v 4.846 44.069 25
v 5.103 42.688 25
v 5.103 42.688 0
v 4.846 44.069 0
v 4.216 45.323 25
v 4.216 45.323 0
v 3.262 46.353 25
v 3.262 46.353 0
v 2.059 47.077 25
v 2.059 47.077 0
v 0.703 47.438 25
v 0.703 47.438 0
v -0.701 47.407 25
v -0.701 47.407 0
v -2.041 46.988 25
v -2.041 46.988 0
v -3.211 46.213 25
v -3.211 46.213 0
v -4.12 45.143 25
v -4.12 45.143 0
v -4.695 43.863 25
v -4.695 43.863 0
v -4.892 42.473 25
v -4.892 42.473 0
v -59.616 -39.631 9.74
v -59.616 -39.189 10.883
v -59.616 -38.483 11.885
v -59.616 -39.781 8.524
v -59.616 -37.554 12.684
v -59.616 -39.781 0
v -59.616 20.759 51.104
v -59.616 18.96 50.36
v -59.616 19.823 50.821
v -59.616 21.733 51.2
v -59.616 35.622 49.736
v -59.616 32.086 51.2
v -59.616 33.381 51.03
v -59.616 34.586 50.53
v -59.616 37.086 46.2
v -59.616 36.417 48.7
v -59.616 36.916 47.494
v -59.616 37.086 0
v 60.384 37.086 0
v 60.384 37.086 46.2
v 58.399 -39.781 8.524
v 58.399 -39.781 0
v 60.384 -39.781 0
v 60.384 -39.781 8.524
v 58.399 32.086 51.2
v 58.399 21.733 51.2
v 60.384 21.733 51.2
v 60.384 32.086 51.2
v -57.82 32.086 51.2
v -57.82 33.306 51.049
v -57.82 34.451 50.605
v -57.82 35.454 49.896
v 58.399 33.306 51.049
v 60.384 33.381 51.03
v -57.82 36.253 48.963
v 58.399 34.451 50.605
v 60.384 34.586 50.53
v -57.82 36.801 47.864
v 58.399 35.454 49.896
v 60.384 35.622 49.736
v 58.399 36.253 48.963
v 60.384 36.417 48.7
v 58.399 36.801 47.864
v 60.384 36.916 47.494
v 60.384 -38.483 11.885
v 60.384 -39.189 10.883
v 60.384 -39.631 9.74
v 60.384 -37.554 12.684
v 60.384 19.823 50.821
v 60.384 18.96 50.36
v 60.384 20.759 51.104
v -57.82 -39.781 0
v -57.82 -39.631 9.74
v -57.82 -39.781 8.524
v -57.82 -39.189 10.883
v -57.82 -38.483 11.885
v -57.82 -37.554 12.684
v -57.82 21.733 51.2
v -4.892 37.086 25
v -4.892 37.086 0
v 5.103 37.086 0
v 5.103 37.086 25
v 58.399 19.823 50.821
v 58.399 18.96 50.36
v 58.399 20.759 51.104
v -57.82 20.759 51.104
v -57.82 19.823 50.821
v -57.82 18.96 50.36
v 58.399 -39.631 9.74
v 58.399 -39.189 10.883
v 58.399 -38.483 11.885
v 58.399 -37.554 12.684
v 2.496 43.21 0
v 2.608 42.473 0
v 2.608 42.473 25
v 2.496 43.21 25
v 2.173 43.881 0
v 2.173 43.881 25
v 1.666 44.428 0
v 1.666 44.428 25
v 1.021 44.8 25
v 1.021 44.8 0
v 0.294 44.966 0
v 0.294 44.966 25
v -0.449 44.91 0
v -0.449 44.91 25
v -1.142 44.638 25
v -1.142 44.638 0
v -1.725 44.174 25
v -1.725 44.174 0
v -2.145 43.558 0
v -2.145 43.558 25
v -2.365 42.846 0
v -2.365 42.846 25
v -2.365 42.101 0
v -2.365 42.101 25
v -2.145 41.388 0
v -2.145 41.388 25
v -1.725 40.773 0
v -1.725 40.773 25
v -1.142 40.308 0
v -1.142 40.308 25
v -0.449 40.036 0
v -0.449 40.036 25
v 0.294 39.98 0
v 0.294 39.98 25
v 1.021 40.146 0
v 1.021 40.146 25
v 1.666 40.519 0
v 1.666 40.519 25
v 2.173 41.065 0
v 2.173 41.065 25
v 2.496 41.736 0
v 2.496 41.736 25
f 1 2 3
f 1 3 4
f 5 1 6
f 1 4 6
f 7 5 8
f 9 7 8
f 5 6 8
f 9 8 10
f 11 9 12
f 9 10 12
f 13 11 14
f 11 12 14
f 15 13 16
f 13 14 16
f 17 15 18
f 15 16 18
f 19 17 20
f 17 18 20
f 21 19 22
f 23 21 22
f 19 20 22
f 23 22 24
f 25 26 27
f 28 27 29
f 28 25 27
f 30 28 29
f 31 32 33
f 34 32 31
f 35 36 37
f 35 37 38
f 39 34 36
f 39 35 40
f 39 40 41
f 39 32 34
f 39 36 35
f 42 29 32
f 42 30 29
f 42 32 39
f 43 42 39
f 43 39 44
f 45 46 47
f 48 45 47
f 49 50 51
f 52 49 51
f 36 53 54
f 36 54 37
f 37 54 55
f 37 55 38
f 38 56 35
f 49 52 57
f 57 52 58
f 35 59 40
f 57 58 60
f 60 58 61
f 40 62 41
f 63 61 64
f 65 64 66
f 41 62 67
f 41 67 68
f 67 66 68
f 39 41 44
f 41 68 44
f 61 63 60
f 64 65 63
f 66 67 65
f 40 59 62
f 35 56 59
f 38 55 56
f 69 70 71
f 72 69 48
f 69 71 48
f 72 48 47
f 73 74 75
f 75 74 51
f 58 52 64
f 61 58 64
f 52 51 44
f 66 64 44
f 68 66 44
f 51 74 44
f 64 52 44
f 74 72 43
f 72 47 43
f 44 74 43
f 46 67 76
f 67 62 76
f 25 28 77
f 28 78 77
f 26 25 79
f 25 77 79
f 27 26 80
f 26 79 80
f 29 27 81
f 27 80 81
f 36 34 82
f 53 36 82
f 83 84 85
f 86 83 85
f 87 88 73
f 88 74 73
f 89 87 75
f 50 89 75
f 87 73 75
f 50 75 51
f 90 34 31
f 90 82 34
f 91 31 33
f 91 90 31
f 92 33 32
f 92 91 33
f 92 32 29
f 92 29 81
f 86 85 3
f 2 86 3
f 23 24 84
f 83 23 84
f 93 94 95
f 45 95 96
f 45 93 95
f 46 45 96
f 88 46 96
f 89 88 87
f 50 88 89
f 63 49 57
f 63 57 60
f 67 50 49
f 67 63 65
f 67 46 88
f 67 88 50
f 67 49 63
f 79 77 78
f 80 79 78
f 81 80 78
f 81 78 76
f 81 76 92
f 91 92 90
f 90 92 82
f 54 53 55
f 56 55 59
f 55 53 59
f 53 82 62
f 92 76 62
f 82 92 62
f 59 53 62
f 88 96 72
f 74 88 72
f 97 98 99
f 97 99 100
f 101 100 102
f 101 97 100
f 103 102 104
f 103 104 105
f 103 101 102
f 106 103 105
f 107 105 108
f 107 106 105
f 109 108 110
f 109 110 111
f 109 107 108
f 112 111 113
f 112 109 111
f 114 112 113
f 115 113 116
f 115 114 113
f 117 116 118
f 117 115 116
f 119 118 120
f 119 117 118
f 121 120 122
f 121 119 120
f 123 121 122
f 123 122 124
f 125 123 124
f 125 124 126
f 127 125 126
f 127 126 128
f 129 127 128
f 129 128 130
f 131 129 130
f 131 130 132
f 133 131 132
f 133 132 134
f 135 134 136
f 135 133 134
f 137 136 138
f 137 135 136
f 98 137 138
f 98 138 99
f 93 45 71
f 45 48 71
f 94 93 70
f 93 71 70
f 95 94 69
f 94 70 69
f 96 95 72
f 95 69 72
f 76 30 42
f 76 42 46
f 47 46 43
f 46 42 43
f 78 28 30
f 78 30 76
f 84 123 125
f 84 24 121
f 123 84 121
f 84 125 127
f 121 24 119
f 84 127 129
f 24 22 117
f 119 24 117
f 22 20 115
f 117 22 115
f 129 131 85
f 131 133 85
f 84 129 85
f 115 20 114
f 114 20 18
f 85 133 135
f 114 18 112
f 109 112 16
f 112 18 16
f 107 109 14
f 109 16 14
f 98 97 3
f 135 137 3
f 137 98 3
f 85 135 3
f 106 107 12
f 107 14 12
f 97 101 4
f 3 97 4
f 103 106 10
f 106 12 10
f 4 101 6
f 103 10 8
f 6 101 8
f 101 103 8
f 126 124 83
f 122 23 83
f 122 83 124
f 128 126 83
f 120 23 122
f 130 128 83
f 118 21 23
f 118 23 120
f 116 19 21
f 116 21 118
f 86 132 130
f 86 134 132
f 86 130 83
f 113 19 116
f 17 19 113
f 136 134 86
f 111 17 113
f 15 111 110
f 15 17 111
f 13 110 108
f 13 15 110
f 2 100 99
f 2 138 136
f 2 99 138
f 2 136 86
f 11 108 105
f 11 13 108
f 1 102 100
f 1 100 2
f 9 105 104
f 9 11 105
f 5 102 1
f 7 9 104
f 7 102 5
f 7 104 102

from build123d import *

# Parameters (mm, degrees)
F1_DEPTH    = 50
F2_T1_DEPTH = 529.8735996938
F0_R        = 2.5
F3_DEPTH    = 25
F0_W        = 1.7954435945
F0_H        = 76.8672563136
F0_W_2      = 1.9858591259
F4_DEPTH    = 51.2
F5_SIZE2    = 40
F5_SIZE     = 60
F5_2_SIZE2  = 40
F5_2_SIZE   = 60
F6_R        = 5


# Not quite as in the source:
# - a fillet or chamfer that OpenCascade refuses, or shapes differently, is made with other operations: its cross-section is extruded or revolved along the edge and cut away or added


with BuildPart() as f1:
    # F0 (on Top) → F1 (new body)
    with BuildSketch(Plane.XY):
        Polygon((-4.8924816283, 37.0864719152), (-57.8201711178, 37.0864719152), (-57.8201711178, -39.7807843983), (58.3985261619, -39.7807843983), (58.3985261619, 37.0864719152), (5.1028808584, 37.0864719152), align=None)
    extrude(amount=F1_DEPTH)

    # F2: chamfer of 80 x 50 on 1 edges, made by hand

    # F2_s2 → F2_t1 (cut)
    with BuildSketch(Plane.YZ.offset(-264.6476223249)):
        Polygon((40.2192156017, 50), (-39.7807843983, 0), (-39.7807843983, 50), align=None)
    extrude(amount=F2_T1_DEPTH, mode=Mode.SUBTRACT)

    # F0 (on Top) → F4 (join)
    with BuildSketch(Plane.XY):
        with Locations((-58.717892915, -1.3471562415)):
            Rectangle(F0_W, F0_H)
        with Locations((59.3914557248, -1.3471562415)):
            Rectangle(F0_W_2, F0_H)
    extrude(amount=F4_DEPTH)

    # F5
    f5_edges = [f1.edges().sort_by_distance(p)[0] for p in [
        (-58.717893, -39.780784, 51.2),
    ]]
    f5_side = f1.faces().sort_by_distance((-58.717893, -1.347156, 51.2))[0]
    chamfer(f5_edges, length=F5_SIZE, length2=F5_SIZE2, reference=f5_side)

    # F5#2
    f5_2_edges = [f1.edges().sort_by_distance(p)[0] for p in [
        (59.391456, -39.780784, 51.2),
    ]]
    f5_2_side = f1.faces().sort_by_distance((59.391456, -1.347156, 51.2))[0]
    chamfer(f5_2_edges, length=F5_2_SIZE, length2=F5_2_SIZE2, reference=f5_2_side)

    # F6
    f6_edges = [f1.edges().sort_by_distance(p)[0] for p in [
        (59.391456, 37.086472, 51.2),
        (59.391456, 20.219216, 51.2),
        (-58.717893, 20.219216, 51.2),
        (59.391456, -39.780784, 11.2),
        (-58.717893, -39.780784, 11.2),
    ]]
    fillet(f6_edges, radius=F6_R)


with BuildPart() as f3:
    # F0 (on Top) → F3 (new body)
    with BuildSketch(Plane.XY):
        with BuildLine():
            ThreePointArc((5.1028808584, 42.6884462108), (-0.0001560601, 47.4719877743), (-4.8924816283, 42.4731472871))
            ThreePointArc((-4.8924816283, 42.4731472871), (-0.0001560601, 37.4743067999), (5.1028808584, 42.2578483634))
            Line((5.1028808584, 42.2578483634), (5.1028808584, 42.6884462108))
        make_face()
        with Locations((0.1075183717, 42.4731472871)):
            Circle(F0_R, mode=Mode.SUBTRACT)
        with BuildLine():
            Line((-4.8924816283, 42.4731472871), (-4.8924816283, 37.0864719152))
            Line((-4.8924816283, 37.0864719152), (5.1028808584, 37.0864719152))
            Line((5.1028808584, 37.0864719152), (5.1028808584, 42.2578483634))
            ThreePointArc((5.1028808584, 42.2578483634), (-0.0001560601, 37.4743067999), (-4.8924816283, 42.4731472871))
        make_face()
    extrude(amount=F3_DEPTH)


solid = Compound([f1.part, f3.part])
